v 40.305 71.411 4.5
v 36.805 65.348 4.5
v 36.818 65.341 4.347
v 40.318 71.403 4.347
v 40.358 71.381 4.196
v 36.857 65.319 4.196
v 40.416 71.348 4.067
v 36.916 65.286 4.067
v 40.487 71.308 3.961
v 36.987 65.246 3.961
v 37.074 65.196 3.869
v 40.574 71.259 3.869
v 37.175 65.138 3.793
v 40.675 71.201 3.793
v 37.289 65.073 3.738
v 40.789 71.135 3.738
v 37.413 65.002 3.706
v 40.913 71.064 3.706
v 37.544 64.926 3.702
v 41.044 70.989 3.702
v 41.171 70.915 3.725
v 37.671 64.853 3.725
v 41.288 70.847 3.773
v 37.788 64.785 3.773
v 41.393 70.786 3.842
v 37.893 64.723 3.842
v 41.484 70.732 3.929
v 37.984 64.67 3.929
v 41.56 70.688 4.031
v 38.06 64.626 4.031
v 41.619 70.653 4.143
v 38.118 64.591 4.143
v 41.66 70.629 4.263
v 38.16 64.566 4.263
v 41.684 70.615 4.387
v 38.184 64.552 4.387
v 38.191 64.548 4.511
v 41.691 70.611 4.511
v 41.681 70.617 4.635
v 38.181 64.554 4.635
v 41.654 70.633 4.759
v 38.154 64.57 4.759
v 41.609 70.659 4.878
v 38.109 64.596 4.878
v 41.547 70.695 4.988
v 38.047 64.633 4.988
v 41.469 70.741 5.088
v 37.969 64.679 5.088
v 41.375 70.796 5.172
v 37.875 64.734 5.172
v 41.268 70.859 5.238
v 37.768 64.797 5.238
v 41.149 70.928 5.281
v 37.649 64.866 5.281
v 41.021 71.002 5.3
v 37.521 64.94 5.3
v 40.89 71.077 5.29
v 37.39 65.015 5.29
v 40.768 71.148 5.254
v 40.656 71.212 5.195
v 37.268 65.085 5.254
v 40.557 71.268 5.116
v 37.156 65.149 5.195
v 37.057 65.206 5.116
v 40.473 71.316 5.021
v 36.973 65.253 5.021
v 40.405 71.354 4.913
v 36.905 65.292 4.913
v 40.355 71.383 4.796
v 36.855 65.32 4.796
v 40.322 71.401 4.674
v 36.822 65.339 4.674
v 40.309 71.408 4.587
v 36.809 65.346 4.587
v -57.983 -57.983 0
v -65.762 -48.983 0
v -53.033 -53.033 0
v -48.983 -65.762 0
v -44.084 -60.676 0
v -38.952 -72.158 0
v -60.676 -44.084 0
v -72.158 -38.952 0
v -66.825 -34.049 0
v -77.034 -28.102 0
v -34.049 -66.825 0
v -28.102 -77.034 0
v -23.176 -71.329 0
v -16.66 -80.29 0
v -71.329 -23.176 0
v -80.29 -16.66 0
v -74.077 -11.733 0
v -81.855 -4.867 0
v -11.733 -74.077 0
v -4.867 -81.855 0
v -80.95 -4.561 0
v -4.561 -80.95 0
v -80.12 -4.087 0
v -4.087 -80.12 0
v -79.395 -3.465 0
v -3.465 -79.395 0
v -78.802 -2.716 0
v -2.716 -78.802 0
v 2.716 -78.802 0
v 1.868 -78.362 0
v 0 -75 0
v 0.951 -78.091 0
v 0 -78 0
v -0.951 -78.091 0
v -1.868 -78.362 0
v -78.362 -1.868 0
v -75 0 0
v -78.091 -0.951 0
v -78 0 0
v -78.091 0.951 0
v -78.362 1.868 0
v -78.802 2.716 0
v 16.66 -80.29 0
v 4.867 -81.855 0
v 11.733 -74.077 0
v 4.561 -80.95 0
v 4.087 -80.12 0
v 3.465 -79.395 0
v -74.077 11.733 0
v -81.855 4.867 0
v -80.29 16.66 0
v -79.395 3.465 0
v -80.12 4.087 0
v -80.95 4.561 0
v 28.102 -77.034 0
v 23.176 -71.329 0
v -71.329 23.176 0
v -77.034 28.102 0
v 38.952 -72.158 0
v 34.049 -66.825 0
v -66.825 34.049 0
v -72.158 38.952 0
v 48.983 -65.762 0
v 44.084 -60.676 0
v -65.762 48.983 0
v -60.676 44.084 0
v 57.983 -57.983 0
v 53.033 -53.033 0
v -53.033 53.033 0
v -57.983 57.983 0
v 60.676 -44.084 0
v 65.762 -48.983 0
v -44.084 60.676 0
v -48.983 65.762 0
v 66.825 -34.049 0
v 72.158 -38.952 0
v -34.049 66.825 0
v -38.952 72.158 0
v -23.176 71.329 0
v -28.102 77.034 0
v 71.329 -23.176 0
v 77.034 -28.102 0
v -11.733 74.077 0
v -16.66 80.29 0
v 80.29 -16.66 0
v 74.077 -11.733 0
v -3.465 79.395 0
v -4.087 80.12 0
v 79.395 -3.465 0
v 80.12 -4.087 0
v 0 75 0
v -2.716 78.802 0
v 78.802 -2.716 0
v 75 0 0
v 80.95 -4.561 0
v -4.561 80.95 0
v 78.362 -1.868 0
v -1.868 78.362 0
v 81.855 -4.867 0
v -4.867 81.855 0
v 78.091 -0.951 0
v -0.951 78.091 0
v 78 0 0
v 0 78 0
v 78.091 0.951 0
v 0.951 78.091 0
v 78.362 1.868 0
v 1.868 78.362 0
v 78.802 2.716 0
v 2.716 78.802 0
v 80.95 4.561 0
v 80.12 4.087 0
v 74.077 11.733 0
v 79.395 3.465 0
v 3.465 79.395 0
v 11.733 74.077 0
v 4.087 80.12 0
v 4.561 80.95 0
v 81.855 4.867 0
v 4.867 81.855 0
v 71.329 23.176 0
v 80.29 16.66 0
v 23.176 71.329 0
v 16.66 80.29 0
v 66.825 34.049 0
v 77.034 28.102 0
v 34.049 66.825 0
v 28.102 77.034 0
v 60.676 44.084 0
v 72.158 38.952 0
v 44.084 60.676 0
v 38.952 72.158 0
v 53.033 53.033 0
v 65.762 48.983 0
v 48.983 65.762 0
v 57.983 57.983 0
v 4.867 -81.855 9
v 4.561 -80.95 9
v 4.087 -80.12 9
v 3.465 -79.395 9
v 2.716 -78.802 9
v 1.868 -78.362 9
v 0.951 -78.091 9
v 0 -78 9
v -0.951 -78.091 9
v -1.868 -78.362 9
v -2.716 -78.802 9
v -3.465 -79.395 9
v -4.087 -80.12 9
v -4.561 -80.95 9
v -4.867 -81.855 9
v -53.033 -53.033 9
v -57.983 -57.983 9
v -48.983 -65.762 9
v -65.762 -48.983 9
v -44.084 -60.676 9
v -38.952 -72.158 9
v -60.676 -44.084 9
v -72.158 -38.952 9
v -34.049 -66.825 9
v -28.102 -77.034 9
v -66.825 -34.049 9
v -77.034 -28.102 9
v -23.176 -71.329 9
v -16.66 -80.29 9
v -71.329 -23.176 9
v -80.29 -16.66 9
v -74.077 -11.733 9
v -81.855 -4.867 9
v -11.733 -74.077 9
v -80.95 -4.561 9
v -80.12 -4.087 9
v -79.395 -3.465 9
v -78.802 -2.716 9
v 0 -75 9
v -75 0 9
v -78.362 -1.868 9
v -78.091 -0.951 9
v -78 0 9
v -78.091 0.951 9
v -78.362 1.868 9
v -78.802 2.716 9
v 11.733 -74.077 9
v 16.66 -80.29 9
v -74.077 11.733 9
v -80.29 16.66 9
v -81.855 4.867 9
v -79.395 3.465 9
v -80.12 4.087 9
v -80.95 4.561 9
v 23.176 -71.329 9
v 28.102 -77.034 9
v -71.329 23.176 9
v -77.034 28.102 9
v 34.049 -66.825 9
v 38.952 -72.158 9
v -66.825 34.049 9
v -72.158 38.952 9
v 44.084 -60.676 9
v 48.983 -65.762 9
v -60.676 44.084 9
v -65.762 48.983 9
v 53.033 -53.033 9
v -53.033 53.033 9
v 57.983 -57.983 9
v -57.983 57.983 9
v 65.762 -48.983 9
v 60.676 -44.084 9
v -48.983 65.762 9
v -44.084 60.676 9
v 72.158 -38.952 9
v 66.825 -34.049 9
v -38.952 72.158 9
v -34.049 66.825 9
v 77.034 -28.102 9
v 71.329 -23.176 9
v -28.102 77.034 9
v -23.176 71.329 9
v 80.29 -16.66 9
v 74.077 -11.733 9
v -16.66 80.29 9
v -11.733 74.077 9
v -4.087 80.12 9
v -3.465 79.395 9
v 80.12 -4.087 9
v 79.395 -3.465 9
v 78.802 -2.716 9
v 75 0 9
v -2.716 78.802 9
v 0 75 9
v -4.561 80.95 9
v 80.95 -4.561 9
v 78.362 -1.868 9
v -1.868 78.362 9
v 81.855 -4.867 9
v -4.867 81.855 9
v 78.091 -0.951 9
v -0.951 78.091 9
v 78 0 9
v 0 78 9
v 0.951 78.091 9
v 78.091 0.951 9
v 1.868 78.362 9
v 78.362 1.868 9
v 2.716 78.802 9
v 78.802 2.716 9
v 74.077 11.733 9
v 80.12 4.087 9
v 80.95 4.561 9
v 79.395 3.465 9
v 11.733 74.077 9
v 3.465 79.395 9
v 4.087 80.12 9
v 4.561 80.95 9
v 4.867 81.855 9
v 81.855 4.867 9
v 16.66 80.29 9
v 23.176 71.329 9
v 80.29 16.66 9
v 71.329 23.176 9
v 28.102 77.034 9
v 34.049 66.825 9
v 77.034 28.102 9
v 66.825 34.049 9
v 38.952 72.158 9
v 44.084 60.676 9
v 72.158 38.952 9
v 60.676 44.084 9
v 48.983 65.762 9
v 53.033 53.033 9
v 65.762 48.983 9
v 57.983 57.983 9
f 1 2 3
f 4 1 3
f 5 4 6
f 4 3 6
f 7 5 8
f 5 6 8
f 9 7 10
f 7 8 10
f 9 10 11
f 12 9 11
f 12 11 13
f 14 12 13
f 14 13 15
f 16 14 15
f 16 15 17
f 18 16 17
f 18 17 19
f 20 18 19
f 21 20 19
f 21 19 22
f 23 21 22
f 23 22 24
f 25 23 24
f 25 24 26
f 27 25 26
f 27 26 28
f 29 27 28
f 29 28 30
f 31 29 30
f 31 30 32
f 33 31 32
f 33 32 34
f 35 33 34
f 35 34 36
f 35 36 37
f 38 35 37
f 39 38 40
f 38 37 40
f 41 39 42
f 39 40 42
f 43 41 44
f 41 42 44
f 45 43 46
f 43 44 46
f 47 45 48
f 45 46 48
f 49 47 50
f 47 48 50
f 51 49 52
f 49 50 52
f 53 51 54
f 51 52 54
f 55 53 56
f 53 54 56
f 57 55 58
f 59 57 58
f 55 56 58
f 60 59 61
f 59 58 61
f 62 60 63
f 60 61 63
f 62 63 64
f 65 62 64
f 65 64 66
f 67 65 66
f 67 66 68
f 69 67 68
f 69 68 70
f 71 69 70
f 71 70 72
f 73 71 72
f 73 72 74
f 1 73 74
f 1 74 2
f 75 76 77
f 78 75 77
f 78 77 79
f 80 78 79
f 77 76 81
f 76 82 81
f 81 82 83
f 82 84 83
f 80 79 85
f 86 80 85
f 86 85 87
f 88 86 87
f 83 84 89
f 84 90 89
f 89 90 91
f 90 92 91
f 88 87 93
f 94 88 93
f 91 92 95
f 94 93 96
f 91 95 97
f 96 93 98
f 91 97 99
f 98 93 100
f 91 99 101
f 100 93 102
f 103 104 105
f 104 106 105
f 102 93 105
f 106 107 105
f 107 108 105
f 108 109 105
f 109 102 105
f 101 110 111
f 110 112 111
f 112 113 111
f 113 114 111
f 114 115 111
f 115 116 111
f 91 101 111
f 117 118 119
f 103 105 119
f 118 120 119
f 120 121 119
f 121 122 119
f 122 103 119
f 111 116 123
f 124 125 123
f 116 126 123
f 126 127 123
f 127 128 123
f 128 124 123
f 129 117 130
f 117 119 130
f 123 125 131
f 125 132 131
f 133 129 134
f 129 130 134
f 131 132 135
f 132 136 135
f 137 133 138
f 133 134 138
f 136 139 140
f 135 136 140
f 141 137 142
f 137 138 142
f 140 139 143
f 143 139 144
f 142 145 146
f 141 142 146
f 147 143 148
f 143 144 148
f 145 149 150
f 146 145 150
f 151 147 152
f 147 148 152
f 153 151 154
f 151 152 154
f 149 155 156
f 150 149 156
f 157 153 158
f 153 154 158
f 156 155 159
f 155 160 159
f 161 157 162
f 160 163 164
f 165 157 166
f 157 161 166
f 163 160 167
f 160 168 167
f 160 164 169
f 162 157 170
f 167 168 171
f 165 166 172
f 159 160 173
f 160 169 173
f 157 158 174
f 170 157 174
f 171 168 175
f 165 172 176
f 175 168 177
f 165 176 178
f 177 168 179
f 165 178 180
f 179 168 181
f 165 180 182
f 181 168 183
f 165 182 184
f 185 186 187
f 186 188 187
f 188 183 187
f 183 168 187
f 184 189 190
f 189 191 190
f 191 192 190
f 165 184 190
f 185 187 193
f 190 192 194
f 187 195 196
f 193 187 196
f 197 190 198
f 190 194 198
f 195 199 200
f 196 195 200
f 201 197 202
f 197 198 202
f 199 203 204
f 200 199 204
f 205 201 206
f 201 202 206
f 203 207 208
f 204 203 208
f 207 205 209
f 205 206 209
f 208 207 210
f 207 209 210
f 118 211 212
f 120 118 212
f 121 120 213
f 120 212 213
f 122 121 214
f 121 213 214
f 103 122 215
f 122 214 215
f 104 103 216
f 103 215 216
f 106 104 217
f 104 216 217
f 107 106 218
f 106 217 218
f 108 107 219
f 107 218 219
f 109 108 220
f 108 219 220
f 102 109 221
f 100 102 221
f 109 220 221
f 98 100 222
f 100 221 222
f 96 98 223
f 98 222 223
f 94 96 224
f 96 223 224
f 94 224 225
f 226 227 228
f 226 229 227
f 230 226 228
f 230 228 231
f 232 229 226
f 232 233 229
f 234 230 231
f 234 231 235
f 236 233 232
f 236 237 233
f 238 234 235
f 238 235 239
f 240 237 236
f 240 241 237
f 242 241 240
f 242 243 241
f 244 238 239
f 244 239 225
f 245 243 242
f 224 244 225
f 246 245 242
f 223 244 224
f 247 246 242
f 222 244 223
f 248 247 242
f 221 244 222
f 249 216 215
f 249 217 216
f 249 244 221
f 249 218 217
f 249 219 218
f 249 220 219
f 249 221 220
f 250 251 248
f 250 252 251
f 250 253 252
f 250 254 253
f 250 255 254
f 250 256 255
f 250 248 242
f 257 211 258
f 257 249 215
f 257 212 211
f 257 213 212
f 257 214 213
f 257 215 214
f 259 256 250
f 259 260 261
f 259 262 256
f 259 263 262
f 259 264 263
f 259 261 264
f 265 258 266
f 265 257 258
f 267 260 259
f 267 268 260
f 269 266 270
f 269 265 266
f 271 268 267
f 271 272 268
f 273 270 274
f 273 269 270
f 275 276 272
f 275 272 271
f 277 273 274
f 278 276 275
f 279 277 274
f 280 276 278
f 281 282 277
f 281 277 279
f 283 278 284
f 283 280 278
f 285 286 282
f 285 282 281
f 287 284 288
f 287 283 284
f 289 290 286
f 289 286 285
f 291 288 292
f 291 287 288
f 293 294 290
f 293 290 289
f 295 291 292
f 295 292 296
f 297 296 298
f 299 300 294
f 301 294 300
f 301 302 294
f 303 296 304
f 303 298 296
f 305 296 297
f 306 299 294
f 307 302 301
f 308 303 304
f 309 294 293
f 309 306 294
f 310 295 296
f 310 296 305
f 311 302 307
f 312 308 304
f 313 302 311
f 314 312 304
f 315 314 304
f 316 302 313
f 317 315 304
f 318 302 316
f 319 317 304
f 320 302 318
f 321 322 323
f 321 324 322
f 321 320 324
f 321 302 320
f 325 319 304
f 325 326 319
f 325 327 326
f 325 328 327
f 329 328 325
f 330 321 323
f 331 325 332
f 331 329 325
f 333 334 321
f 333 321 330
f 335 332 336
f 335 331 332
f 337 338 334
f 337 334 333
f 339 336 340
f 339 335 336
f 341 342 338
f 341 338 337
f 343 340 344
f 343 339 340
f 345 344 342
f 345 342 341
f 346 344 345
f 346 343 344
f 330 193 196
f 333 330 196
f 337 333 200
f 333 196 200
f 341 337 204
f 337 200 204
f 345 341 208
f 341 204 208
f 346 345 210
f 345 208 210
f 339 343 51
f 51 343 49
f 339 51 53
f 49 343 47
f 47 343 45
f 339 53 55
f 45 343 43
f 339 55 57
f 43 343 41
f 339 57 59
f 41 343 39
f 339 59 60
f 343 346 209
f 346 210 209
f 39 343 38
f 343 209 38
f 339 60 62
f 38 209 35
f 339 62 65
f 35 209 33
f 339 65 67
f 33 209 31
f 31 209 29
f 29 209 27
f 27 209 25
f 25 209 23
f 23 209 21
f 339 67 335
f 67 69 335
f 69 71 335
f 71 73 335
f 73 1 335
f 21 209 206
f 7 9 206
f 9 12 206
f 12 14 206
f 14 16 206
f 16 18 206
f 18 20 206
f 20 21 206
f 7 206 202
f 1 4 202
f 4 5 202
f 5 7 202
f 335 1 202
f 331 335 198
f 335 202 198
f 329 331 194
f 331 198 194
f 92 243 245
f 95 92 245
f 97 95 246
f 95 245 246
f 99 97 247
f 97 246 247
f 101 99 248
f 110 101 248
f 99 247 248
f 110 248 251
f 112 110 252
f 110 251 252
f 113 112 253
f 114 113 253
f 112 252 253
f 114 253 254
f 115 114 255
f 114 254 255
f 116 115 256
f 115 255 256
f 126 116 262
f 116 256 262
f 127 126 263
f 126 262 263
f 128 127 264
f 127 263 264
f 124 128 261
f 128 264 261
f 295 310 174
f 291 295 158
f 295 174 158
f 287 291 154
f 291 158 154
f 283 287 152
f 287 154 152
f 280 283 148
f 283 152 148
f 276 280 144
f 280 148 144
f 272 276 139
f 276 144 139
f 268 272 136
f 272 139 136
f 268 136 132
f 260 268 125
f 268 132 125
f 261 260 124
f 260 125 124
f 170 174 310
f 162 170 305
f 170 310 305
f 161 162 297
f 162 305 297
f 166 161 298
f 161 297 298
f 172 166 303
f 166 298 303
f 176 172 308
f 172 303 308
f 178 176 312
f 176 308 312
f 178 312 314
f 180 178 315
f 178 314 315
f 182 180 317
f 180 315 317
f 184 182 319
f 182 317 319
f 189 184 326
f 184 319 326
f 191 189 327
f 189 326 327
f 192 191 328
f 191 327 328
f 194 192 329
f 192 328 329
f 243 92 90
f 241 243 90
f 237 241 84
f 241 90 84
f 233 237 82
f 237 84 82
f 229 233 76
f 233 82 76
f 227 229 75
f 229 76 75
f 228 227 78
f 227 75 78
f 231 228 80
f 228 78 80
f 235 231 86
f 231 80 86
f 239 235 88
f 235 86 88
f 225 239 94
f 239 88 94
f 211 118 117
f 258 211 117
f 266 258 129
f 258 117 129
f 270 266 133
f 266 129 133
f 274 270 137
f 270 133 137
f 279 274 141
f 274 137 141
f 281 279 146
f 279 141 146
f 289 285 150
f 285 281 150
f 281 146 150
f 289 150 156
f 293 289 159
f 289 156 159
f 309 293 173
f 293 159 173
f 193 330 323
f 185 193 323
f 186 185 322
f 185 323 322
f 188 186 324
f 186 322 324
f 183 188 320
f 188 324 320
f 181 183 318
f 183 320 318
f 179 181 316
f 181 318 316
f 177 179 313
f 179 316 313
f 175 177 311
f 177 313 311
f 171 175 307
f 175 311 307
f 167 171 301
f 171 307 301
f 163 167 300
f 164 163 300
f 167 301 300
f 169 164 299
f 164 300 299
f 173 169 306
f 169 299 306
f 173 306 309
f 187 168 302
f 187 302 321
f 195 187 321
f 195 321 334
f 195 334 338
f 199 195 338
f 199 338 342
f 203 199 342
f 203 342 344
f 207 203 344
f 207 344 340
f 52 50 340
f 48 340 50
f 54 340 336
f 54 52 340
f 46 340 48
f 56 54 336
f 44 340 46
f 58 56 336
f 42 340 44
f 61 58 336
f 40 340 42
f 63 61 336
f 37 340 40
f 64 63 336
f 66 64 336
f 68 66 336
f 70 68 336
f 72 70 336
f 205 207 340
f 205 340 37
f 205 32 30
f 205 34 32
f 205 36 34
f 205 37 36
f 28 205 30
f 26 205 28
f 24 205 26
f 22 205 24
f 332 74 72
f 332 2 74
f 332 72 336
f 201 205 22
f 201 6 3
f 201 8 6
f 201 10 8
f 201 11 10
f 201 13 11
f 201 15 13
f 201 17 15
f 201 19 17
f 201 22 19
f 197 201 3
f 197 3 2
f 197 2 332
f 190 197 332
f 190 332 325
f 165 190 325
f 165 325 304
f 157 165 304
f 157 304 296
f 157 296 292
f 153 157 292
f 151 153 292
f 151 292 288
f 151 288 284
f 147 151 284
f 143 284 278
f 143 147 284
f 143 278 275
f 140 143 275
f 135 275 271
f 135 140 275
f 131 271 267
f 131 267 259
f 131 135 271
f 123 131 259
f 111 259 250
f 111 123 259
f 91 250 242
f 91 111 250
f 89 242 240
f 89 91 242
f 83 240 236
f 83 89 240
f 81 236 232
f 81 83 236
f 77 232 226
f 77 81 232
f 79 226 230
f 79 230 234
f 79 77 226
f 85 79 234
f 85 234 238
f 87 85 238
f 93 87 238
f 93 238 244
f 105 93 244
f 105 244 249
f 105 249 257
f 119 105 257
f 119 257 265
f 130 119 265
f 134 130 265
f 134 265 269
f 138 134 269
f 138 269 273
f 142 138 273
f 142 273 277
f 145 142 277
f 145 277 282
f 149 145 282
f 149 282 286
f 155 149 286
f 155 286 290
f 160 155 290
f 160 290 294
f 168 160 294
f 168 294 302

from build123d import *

# Parameters (mm, degrees)
SKETCH1_R                 = 82
SKETCH1_R_2               = 75
BOSS_EXTRUDE1_DEPTH       = 9
SKETCH2_R                 = 5
CUT_EXTRUDE1_DEPTH        = 117.314229568
CIRPATTERN1_COUNT         = 4
M2X0_4_TAPPED_HOLE1_D     = 1.6
M2X0_4_TAPPED_HOLE1_DEPTH = 10
M2X0_4_TAPPED_HOLE1_TIP   = 0.480688495


with BuildPart() as part:
    # Sketch1 → Boss-Extrude1 (new body)
    with BuildSketch(Plane.XY):
        Circle(SKETCH1_R)
        Circle(SKETCH1_R_2, mode=Mode.SUBTRACT)
    extrude(amount=BOSS_EXTRUDE1_DEPTH)

    # Sketch2 → Cut-Extrude1 (cut, through all)
    with BuildSketch(Plane.XY.offset(9)):
        with Locations((0, 83)):
            Circle(SKETCH2_R)
    cut_extrude1 = extrude(amount=-CUT_EXTRUDE1_DEPTH, mode=Mode.SUBTRACT)

    # CirPattern1: Cut-Extrude1 ×4 about axis
    cirpattern1_axis = Axis((0, 0, 0), (0, 0, 1))
    for i in range(1, CIRPATTERN1_COUNT):
        add(cut_extrude1.rotate(cirpattern1_axis, i * 360 / CIRPATTERN1_COUNT), mode=Mode.SUBTRACT)

    # M2x0.4 Tapped Hole1
    with Locations(Plane(origin=(41, 71.01408311, 4.5), x_dir=(0.866025403784, -0.5, 0), z_dir=(0.5, 0.866025403784, 0))):
        with Locations((0, 0)):
            Hole(M2X0_4_TAPPED_HOLE1_D / 2, depth=M2X0_4_TAPPED_HOLE1_DEPTH)
            with Locations((0, 0, -(M2X0_4_TAPPED_HOLE1_DEPTH + M2X0_4_TAPPED_HOLE1_TIP / 2))):  # 118° drill point
                Cone(0, M2X0_4_TAPPED_HOLE1_D / 2, M2X0_4_TAPPED_HOLE1_TIP, mode=Mode.SUBTRACT)


solid = part.part
